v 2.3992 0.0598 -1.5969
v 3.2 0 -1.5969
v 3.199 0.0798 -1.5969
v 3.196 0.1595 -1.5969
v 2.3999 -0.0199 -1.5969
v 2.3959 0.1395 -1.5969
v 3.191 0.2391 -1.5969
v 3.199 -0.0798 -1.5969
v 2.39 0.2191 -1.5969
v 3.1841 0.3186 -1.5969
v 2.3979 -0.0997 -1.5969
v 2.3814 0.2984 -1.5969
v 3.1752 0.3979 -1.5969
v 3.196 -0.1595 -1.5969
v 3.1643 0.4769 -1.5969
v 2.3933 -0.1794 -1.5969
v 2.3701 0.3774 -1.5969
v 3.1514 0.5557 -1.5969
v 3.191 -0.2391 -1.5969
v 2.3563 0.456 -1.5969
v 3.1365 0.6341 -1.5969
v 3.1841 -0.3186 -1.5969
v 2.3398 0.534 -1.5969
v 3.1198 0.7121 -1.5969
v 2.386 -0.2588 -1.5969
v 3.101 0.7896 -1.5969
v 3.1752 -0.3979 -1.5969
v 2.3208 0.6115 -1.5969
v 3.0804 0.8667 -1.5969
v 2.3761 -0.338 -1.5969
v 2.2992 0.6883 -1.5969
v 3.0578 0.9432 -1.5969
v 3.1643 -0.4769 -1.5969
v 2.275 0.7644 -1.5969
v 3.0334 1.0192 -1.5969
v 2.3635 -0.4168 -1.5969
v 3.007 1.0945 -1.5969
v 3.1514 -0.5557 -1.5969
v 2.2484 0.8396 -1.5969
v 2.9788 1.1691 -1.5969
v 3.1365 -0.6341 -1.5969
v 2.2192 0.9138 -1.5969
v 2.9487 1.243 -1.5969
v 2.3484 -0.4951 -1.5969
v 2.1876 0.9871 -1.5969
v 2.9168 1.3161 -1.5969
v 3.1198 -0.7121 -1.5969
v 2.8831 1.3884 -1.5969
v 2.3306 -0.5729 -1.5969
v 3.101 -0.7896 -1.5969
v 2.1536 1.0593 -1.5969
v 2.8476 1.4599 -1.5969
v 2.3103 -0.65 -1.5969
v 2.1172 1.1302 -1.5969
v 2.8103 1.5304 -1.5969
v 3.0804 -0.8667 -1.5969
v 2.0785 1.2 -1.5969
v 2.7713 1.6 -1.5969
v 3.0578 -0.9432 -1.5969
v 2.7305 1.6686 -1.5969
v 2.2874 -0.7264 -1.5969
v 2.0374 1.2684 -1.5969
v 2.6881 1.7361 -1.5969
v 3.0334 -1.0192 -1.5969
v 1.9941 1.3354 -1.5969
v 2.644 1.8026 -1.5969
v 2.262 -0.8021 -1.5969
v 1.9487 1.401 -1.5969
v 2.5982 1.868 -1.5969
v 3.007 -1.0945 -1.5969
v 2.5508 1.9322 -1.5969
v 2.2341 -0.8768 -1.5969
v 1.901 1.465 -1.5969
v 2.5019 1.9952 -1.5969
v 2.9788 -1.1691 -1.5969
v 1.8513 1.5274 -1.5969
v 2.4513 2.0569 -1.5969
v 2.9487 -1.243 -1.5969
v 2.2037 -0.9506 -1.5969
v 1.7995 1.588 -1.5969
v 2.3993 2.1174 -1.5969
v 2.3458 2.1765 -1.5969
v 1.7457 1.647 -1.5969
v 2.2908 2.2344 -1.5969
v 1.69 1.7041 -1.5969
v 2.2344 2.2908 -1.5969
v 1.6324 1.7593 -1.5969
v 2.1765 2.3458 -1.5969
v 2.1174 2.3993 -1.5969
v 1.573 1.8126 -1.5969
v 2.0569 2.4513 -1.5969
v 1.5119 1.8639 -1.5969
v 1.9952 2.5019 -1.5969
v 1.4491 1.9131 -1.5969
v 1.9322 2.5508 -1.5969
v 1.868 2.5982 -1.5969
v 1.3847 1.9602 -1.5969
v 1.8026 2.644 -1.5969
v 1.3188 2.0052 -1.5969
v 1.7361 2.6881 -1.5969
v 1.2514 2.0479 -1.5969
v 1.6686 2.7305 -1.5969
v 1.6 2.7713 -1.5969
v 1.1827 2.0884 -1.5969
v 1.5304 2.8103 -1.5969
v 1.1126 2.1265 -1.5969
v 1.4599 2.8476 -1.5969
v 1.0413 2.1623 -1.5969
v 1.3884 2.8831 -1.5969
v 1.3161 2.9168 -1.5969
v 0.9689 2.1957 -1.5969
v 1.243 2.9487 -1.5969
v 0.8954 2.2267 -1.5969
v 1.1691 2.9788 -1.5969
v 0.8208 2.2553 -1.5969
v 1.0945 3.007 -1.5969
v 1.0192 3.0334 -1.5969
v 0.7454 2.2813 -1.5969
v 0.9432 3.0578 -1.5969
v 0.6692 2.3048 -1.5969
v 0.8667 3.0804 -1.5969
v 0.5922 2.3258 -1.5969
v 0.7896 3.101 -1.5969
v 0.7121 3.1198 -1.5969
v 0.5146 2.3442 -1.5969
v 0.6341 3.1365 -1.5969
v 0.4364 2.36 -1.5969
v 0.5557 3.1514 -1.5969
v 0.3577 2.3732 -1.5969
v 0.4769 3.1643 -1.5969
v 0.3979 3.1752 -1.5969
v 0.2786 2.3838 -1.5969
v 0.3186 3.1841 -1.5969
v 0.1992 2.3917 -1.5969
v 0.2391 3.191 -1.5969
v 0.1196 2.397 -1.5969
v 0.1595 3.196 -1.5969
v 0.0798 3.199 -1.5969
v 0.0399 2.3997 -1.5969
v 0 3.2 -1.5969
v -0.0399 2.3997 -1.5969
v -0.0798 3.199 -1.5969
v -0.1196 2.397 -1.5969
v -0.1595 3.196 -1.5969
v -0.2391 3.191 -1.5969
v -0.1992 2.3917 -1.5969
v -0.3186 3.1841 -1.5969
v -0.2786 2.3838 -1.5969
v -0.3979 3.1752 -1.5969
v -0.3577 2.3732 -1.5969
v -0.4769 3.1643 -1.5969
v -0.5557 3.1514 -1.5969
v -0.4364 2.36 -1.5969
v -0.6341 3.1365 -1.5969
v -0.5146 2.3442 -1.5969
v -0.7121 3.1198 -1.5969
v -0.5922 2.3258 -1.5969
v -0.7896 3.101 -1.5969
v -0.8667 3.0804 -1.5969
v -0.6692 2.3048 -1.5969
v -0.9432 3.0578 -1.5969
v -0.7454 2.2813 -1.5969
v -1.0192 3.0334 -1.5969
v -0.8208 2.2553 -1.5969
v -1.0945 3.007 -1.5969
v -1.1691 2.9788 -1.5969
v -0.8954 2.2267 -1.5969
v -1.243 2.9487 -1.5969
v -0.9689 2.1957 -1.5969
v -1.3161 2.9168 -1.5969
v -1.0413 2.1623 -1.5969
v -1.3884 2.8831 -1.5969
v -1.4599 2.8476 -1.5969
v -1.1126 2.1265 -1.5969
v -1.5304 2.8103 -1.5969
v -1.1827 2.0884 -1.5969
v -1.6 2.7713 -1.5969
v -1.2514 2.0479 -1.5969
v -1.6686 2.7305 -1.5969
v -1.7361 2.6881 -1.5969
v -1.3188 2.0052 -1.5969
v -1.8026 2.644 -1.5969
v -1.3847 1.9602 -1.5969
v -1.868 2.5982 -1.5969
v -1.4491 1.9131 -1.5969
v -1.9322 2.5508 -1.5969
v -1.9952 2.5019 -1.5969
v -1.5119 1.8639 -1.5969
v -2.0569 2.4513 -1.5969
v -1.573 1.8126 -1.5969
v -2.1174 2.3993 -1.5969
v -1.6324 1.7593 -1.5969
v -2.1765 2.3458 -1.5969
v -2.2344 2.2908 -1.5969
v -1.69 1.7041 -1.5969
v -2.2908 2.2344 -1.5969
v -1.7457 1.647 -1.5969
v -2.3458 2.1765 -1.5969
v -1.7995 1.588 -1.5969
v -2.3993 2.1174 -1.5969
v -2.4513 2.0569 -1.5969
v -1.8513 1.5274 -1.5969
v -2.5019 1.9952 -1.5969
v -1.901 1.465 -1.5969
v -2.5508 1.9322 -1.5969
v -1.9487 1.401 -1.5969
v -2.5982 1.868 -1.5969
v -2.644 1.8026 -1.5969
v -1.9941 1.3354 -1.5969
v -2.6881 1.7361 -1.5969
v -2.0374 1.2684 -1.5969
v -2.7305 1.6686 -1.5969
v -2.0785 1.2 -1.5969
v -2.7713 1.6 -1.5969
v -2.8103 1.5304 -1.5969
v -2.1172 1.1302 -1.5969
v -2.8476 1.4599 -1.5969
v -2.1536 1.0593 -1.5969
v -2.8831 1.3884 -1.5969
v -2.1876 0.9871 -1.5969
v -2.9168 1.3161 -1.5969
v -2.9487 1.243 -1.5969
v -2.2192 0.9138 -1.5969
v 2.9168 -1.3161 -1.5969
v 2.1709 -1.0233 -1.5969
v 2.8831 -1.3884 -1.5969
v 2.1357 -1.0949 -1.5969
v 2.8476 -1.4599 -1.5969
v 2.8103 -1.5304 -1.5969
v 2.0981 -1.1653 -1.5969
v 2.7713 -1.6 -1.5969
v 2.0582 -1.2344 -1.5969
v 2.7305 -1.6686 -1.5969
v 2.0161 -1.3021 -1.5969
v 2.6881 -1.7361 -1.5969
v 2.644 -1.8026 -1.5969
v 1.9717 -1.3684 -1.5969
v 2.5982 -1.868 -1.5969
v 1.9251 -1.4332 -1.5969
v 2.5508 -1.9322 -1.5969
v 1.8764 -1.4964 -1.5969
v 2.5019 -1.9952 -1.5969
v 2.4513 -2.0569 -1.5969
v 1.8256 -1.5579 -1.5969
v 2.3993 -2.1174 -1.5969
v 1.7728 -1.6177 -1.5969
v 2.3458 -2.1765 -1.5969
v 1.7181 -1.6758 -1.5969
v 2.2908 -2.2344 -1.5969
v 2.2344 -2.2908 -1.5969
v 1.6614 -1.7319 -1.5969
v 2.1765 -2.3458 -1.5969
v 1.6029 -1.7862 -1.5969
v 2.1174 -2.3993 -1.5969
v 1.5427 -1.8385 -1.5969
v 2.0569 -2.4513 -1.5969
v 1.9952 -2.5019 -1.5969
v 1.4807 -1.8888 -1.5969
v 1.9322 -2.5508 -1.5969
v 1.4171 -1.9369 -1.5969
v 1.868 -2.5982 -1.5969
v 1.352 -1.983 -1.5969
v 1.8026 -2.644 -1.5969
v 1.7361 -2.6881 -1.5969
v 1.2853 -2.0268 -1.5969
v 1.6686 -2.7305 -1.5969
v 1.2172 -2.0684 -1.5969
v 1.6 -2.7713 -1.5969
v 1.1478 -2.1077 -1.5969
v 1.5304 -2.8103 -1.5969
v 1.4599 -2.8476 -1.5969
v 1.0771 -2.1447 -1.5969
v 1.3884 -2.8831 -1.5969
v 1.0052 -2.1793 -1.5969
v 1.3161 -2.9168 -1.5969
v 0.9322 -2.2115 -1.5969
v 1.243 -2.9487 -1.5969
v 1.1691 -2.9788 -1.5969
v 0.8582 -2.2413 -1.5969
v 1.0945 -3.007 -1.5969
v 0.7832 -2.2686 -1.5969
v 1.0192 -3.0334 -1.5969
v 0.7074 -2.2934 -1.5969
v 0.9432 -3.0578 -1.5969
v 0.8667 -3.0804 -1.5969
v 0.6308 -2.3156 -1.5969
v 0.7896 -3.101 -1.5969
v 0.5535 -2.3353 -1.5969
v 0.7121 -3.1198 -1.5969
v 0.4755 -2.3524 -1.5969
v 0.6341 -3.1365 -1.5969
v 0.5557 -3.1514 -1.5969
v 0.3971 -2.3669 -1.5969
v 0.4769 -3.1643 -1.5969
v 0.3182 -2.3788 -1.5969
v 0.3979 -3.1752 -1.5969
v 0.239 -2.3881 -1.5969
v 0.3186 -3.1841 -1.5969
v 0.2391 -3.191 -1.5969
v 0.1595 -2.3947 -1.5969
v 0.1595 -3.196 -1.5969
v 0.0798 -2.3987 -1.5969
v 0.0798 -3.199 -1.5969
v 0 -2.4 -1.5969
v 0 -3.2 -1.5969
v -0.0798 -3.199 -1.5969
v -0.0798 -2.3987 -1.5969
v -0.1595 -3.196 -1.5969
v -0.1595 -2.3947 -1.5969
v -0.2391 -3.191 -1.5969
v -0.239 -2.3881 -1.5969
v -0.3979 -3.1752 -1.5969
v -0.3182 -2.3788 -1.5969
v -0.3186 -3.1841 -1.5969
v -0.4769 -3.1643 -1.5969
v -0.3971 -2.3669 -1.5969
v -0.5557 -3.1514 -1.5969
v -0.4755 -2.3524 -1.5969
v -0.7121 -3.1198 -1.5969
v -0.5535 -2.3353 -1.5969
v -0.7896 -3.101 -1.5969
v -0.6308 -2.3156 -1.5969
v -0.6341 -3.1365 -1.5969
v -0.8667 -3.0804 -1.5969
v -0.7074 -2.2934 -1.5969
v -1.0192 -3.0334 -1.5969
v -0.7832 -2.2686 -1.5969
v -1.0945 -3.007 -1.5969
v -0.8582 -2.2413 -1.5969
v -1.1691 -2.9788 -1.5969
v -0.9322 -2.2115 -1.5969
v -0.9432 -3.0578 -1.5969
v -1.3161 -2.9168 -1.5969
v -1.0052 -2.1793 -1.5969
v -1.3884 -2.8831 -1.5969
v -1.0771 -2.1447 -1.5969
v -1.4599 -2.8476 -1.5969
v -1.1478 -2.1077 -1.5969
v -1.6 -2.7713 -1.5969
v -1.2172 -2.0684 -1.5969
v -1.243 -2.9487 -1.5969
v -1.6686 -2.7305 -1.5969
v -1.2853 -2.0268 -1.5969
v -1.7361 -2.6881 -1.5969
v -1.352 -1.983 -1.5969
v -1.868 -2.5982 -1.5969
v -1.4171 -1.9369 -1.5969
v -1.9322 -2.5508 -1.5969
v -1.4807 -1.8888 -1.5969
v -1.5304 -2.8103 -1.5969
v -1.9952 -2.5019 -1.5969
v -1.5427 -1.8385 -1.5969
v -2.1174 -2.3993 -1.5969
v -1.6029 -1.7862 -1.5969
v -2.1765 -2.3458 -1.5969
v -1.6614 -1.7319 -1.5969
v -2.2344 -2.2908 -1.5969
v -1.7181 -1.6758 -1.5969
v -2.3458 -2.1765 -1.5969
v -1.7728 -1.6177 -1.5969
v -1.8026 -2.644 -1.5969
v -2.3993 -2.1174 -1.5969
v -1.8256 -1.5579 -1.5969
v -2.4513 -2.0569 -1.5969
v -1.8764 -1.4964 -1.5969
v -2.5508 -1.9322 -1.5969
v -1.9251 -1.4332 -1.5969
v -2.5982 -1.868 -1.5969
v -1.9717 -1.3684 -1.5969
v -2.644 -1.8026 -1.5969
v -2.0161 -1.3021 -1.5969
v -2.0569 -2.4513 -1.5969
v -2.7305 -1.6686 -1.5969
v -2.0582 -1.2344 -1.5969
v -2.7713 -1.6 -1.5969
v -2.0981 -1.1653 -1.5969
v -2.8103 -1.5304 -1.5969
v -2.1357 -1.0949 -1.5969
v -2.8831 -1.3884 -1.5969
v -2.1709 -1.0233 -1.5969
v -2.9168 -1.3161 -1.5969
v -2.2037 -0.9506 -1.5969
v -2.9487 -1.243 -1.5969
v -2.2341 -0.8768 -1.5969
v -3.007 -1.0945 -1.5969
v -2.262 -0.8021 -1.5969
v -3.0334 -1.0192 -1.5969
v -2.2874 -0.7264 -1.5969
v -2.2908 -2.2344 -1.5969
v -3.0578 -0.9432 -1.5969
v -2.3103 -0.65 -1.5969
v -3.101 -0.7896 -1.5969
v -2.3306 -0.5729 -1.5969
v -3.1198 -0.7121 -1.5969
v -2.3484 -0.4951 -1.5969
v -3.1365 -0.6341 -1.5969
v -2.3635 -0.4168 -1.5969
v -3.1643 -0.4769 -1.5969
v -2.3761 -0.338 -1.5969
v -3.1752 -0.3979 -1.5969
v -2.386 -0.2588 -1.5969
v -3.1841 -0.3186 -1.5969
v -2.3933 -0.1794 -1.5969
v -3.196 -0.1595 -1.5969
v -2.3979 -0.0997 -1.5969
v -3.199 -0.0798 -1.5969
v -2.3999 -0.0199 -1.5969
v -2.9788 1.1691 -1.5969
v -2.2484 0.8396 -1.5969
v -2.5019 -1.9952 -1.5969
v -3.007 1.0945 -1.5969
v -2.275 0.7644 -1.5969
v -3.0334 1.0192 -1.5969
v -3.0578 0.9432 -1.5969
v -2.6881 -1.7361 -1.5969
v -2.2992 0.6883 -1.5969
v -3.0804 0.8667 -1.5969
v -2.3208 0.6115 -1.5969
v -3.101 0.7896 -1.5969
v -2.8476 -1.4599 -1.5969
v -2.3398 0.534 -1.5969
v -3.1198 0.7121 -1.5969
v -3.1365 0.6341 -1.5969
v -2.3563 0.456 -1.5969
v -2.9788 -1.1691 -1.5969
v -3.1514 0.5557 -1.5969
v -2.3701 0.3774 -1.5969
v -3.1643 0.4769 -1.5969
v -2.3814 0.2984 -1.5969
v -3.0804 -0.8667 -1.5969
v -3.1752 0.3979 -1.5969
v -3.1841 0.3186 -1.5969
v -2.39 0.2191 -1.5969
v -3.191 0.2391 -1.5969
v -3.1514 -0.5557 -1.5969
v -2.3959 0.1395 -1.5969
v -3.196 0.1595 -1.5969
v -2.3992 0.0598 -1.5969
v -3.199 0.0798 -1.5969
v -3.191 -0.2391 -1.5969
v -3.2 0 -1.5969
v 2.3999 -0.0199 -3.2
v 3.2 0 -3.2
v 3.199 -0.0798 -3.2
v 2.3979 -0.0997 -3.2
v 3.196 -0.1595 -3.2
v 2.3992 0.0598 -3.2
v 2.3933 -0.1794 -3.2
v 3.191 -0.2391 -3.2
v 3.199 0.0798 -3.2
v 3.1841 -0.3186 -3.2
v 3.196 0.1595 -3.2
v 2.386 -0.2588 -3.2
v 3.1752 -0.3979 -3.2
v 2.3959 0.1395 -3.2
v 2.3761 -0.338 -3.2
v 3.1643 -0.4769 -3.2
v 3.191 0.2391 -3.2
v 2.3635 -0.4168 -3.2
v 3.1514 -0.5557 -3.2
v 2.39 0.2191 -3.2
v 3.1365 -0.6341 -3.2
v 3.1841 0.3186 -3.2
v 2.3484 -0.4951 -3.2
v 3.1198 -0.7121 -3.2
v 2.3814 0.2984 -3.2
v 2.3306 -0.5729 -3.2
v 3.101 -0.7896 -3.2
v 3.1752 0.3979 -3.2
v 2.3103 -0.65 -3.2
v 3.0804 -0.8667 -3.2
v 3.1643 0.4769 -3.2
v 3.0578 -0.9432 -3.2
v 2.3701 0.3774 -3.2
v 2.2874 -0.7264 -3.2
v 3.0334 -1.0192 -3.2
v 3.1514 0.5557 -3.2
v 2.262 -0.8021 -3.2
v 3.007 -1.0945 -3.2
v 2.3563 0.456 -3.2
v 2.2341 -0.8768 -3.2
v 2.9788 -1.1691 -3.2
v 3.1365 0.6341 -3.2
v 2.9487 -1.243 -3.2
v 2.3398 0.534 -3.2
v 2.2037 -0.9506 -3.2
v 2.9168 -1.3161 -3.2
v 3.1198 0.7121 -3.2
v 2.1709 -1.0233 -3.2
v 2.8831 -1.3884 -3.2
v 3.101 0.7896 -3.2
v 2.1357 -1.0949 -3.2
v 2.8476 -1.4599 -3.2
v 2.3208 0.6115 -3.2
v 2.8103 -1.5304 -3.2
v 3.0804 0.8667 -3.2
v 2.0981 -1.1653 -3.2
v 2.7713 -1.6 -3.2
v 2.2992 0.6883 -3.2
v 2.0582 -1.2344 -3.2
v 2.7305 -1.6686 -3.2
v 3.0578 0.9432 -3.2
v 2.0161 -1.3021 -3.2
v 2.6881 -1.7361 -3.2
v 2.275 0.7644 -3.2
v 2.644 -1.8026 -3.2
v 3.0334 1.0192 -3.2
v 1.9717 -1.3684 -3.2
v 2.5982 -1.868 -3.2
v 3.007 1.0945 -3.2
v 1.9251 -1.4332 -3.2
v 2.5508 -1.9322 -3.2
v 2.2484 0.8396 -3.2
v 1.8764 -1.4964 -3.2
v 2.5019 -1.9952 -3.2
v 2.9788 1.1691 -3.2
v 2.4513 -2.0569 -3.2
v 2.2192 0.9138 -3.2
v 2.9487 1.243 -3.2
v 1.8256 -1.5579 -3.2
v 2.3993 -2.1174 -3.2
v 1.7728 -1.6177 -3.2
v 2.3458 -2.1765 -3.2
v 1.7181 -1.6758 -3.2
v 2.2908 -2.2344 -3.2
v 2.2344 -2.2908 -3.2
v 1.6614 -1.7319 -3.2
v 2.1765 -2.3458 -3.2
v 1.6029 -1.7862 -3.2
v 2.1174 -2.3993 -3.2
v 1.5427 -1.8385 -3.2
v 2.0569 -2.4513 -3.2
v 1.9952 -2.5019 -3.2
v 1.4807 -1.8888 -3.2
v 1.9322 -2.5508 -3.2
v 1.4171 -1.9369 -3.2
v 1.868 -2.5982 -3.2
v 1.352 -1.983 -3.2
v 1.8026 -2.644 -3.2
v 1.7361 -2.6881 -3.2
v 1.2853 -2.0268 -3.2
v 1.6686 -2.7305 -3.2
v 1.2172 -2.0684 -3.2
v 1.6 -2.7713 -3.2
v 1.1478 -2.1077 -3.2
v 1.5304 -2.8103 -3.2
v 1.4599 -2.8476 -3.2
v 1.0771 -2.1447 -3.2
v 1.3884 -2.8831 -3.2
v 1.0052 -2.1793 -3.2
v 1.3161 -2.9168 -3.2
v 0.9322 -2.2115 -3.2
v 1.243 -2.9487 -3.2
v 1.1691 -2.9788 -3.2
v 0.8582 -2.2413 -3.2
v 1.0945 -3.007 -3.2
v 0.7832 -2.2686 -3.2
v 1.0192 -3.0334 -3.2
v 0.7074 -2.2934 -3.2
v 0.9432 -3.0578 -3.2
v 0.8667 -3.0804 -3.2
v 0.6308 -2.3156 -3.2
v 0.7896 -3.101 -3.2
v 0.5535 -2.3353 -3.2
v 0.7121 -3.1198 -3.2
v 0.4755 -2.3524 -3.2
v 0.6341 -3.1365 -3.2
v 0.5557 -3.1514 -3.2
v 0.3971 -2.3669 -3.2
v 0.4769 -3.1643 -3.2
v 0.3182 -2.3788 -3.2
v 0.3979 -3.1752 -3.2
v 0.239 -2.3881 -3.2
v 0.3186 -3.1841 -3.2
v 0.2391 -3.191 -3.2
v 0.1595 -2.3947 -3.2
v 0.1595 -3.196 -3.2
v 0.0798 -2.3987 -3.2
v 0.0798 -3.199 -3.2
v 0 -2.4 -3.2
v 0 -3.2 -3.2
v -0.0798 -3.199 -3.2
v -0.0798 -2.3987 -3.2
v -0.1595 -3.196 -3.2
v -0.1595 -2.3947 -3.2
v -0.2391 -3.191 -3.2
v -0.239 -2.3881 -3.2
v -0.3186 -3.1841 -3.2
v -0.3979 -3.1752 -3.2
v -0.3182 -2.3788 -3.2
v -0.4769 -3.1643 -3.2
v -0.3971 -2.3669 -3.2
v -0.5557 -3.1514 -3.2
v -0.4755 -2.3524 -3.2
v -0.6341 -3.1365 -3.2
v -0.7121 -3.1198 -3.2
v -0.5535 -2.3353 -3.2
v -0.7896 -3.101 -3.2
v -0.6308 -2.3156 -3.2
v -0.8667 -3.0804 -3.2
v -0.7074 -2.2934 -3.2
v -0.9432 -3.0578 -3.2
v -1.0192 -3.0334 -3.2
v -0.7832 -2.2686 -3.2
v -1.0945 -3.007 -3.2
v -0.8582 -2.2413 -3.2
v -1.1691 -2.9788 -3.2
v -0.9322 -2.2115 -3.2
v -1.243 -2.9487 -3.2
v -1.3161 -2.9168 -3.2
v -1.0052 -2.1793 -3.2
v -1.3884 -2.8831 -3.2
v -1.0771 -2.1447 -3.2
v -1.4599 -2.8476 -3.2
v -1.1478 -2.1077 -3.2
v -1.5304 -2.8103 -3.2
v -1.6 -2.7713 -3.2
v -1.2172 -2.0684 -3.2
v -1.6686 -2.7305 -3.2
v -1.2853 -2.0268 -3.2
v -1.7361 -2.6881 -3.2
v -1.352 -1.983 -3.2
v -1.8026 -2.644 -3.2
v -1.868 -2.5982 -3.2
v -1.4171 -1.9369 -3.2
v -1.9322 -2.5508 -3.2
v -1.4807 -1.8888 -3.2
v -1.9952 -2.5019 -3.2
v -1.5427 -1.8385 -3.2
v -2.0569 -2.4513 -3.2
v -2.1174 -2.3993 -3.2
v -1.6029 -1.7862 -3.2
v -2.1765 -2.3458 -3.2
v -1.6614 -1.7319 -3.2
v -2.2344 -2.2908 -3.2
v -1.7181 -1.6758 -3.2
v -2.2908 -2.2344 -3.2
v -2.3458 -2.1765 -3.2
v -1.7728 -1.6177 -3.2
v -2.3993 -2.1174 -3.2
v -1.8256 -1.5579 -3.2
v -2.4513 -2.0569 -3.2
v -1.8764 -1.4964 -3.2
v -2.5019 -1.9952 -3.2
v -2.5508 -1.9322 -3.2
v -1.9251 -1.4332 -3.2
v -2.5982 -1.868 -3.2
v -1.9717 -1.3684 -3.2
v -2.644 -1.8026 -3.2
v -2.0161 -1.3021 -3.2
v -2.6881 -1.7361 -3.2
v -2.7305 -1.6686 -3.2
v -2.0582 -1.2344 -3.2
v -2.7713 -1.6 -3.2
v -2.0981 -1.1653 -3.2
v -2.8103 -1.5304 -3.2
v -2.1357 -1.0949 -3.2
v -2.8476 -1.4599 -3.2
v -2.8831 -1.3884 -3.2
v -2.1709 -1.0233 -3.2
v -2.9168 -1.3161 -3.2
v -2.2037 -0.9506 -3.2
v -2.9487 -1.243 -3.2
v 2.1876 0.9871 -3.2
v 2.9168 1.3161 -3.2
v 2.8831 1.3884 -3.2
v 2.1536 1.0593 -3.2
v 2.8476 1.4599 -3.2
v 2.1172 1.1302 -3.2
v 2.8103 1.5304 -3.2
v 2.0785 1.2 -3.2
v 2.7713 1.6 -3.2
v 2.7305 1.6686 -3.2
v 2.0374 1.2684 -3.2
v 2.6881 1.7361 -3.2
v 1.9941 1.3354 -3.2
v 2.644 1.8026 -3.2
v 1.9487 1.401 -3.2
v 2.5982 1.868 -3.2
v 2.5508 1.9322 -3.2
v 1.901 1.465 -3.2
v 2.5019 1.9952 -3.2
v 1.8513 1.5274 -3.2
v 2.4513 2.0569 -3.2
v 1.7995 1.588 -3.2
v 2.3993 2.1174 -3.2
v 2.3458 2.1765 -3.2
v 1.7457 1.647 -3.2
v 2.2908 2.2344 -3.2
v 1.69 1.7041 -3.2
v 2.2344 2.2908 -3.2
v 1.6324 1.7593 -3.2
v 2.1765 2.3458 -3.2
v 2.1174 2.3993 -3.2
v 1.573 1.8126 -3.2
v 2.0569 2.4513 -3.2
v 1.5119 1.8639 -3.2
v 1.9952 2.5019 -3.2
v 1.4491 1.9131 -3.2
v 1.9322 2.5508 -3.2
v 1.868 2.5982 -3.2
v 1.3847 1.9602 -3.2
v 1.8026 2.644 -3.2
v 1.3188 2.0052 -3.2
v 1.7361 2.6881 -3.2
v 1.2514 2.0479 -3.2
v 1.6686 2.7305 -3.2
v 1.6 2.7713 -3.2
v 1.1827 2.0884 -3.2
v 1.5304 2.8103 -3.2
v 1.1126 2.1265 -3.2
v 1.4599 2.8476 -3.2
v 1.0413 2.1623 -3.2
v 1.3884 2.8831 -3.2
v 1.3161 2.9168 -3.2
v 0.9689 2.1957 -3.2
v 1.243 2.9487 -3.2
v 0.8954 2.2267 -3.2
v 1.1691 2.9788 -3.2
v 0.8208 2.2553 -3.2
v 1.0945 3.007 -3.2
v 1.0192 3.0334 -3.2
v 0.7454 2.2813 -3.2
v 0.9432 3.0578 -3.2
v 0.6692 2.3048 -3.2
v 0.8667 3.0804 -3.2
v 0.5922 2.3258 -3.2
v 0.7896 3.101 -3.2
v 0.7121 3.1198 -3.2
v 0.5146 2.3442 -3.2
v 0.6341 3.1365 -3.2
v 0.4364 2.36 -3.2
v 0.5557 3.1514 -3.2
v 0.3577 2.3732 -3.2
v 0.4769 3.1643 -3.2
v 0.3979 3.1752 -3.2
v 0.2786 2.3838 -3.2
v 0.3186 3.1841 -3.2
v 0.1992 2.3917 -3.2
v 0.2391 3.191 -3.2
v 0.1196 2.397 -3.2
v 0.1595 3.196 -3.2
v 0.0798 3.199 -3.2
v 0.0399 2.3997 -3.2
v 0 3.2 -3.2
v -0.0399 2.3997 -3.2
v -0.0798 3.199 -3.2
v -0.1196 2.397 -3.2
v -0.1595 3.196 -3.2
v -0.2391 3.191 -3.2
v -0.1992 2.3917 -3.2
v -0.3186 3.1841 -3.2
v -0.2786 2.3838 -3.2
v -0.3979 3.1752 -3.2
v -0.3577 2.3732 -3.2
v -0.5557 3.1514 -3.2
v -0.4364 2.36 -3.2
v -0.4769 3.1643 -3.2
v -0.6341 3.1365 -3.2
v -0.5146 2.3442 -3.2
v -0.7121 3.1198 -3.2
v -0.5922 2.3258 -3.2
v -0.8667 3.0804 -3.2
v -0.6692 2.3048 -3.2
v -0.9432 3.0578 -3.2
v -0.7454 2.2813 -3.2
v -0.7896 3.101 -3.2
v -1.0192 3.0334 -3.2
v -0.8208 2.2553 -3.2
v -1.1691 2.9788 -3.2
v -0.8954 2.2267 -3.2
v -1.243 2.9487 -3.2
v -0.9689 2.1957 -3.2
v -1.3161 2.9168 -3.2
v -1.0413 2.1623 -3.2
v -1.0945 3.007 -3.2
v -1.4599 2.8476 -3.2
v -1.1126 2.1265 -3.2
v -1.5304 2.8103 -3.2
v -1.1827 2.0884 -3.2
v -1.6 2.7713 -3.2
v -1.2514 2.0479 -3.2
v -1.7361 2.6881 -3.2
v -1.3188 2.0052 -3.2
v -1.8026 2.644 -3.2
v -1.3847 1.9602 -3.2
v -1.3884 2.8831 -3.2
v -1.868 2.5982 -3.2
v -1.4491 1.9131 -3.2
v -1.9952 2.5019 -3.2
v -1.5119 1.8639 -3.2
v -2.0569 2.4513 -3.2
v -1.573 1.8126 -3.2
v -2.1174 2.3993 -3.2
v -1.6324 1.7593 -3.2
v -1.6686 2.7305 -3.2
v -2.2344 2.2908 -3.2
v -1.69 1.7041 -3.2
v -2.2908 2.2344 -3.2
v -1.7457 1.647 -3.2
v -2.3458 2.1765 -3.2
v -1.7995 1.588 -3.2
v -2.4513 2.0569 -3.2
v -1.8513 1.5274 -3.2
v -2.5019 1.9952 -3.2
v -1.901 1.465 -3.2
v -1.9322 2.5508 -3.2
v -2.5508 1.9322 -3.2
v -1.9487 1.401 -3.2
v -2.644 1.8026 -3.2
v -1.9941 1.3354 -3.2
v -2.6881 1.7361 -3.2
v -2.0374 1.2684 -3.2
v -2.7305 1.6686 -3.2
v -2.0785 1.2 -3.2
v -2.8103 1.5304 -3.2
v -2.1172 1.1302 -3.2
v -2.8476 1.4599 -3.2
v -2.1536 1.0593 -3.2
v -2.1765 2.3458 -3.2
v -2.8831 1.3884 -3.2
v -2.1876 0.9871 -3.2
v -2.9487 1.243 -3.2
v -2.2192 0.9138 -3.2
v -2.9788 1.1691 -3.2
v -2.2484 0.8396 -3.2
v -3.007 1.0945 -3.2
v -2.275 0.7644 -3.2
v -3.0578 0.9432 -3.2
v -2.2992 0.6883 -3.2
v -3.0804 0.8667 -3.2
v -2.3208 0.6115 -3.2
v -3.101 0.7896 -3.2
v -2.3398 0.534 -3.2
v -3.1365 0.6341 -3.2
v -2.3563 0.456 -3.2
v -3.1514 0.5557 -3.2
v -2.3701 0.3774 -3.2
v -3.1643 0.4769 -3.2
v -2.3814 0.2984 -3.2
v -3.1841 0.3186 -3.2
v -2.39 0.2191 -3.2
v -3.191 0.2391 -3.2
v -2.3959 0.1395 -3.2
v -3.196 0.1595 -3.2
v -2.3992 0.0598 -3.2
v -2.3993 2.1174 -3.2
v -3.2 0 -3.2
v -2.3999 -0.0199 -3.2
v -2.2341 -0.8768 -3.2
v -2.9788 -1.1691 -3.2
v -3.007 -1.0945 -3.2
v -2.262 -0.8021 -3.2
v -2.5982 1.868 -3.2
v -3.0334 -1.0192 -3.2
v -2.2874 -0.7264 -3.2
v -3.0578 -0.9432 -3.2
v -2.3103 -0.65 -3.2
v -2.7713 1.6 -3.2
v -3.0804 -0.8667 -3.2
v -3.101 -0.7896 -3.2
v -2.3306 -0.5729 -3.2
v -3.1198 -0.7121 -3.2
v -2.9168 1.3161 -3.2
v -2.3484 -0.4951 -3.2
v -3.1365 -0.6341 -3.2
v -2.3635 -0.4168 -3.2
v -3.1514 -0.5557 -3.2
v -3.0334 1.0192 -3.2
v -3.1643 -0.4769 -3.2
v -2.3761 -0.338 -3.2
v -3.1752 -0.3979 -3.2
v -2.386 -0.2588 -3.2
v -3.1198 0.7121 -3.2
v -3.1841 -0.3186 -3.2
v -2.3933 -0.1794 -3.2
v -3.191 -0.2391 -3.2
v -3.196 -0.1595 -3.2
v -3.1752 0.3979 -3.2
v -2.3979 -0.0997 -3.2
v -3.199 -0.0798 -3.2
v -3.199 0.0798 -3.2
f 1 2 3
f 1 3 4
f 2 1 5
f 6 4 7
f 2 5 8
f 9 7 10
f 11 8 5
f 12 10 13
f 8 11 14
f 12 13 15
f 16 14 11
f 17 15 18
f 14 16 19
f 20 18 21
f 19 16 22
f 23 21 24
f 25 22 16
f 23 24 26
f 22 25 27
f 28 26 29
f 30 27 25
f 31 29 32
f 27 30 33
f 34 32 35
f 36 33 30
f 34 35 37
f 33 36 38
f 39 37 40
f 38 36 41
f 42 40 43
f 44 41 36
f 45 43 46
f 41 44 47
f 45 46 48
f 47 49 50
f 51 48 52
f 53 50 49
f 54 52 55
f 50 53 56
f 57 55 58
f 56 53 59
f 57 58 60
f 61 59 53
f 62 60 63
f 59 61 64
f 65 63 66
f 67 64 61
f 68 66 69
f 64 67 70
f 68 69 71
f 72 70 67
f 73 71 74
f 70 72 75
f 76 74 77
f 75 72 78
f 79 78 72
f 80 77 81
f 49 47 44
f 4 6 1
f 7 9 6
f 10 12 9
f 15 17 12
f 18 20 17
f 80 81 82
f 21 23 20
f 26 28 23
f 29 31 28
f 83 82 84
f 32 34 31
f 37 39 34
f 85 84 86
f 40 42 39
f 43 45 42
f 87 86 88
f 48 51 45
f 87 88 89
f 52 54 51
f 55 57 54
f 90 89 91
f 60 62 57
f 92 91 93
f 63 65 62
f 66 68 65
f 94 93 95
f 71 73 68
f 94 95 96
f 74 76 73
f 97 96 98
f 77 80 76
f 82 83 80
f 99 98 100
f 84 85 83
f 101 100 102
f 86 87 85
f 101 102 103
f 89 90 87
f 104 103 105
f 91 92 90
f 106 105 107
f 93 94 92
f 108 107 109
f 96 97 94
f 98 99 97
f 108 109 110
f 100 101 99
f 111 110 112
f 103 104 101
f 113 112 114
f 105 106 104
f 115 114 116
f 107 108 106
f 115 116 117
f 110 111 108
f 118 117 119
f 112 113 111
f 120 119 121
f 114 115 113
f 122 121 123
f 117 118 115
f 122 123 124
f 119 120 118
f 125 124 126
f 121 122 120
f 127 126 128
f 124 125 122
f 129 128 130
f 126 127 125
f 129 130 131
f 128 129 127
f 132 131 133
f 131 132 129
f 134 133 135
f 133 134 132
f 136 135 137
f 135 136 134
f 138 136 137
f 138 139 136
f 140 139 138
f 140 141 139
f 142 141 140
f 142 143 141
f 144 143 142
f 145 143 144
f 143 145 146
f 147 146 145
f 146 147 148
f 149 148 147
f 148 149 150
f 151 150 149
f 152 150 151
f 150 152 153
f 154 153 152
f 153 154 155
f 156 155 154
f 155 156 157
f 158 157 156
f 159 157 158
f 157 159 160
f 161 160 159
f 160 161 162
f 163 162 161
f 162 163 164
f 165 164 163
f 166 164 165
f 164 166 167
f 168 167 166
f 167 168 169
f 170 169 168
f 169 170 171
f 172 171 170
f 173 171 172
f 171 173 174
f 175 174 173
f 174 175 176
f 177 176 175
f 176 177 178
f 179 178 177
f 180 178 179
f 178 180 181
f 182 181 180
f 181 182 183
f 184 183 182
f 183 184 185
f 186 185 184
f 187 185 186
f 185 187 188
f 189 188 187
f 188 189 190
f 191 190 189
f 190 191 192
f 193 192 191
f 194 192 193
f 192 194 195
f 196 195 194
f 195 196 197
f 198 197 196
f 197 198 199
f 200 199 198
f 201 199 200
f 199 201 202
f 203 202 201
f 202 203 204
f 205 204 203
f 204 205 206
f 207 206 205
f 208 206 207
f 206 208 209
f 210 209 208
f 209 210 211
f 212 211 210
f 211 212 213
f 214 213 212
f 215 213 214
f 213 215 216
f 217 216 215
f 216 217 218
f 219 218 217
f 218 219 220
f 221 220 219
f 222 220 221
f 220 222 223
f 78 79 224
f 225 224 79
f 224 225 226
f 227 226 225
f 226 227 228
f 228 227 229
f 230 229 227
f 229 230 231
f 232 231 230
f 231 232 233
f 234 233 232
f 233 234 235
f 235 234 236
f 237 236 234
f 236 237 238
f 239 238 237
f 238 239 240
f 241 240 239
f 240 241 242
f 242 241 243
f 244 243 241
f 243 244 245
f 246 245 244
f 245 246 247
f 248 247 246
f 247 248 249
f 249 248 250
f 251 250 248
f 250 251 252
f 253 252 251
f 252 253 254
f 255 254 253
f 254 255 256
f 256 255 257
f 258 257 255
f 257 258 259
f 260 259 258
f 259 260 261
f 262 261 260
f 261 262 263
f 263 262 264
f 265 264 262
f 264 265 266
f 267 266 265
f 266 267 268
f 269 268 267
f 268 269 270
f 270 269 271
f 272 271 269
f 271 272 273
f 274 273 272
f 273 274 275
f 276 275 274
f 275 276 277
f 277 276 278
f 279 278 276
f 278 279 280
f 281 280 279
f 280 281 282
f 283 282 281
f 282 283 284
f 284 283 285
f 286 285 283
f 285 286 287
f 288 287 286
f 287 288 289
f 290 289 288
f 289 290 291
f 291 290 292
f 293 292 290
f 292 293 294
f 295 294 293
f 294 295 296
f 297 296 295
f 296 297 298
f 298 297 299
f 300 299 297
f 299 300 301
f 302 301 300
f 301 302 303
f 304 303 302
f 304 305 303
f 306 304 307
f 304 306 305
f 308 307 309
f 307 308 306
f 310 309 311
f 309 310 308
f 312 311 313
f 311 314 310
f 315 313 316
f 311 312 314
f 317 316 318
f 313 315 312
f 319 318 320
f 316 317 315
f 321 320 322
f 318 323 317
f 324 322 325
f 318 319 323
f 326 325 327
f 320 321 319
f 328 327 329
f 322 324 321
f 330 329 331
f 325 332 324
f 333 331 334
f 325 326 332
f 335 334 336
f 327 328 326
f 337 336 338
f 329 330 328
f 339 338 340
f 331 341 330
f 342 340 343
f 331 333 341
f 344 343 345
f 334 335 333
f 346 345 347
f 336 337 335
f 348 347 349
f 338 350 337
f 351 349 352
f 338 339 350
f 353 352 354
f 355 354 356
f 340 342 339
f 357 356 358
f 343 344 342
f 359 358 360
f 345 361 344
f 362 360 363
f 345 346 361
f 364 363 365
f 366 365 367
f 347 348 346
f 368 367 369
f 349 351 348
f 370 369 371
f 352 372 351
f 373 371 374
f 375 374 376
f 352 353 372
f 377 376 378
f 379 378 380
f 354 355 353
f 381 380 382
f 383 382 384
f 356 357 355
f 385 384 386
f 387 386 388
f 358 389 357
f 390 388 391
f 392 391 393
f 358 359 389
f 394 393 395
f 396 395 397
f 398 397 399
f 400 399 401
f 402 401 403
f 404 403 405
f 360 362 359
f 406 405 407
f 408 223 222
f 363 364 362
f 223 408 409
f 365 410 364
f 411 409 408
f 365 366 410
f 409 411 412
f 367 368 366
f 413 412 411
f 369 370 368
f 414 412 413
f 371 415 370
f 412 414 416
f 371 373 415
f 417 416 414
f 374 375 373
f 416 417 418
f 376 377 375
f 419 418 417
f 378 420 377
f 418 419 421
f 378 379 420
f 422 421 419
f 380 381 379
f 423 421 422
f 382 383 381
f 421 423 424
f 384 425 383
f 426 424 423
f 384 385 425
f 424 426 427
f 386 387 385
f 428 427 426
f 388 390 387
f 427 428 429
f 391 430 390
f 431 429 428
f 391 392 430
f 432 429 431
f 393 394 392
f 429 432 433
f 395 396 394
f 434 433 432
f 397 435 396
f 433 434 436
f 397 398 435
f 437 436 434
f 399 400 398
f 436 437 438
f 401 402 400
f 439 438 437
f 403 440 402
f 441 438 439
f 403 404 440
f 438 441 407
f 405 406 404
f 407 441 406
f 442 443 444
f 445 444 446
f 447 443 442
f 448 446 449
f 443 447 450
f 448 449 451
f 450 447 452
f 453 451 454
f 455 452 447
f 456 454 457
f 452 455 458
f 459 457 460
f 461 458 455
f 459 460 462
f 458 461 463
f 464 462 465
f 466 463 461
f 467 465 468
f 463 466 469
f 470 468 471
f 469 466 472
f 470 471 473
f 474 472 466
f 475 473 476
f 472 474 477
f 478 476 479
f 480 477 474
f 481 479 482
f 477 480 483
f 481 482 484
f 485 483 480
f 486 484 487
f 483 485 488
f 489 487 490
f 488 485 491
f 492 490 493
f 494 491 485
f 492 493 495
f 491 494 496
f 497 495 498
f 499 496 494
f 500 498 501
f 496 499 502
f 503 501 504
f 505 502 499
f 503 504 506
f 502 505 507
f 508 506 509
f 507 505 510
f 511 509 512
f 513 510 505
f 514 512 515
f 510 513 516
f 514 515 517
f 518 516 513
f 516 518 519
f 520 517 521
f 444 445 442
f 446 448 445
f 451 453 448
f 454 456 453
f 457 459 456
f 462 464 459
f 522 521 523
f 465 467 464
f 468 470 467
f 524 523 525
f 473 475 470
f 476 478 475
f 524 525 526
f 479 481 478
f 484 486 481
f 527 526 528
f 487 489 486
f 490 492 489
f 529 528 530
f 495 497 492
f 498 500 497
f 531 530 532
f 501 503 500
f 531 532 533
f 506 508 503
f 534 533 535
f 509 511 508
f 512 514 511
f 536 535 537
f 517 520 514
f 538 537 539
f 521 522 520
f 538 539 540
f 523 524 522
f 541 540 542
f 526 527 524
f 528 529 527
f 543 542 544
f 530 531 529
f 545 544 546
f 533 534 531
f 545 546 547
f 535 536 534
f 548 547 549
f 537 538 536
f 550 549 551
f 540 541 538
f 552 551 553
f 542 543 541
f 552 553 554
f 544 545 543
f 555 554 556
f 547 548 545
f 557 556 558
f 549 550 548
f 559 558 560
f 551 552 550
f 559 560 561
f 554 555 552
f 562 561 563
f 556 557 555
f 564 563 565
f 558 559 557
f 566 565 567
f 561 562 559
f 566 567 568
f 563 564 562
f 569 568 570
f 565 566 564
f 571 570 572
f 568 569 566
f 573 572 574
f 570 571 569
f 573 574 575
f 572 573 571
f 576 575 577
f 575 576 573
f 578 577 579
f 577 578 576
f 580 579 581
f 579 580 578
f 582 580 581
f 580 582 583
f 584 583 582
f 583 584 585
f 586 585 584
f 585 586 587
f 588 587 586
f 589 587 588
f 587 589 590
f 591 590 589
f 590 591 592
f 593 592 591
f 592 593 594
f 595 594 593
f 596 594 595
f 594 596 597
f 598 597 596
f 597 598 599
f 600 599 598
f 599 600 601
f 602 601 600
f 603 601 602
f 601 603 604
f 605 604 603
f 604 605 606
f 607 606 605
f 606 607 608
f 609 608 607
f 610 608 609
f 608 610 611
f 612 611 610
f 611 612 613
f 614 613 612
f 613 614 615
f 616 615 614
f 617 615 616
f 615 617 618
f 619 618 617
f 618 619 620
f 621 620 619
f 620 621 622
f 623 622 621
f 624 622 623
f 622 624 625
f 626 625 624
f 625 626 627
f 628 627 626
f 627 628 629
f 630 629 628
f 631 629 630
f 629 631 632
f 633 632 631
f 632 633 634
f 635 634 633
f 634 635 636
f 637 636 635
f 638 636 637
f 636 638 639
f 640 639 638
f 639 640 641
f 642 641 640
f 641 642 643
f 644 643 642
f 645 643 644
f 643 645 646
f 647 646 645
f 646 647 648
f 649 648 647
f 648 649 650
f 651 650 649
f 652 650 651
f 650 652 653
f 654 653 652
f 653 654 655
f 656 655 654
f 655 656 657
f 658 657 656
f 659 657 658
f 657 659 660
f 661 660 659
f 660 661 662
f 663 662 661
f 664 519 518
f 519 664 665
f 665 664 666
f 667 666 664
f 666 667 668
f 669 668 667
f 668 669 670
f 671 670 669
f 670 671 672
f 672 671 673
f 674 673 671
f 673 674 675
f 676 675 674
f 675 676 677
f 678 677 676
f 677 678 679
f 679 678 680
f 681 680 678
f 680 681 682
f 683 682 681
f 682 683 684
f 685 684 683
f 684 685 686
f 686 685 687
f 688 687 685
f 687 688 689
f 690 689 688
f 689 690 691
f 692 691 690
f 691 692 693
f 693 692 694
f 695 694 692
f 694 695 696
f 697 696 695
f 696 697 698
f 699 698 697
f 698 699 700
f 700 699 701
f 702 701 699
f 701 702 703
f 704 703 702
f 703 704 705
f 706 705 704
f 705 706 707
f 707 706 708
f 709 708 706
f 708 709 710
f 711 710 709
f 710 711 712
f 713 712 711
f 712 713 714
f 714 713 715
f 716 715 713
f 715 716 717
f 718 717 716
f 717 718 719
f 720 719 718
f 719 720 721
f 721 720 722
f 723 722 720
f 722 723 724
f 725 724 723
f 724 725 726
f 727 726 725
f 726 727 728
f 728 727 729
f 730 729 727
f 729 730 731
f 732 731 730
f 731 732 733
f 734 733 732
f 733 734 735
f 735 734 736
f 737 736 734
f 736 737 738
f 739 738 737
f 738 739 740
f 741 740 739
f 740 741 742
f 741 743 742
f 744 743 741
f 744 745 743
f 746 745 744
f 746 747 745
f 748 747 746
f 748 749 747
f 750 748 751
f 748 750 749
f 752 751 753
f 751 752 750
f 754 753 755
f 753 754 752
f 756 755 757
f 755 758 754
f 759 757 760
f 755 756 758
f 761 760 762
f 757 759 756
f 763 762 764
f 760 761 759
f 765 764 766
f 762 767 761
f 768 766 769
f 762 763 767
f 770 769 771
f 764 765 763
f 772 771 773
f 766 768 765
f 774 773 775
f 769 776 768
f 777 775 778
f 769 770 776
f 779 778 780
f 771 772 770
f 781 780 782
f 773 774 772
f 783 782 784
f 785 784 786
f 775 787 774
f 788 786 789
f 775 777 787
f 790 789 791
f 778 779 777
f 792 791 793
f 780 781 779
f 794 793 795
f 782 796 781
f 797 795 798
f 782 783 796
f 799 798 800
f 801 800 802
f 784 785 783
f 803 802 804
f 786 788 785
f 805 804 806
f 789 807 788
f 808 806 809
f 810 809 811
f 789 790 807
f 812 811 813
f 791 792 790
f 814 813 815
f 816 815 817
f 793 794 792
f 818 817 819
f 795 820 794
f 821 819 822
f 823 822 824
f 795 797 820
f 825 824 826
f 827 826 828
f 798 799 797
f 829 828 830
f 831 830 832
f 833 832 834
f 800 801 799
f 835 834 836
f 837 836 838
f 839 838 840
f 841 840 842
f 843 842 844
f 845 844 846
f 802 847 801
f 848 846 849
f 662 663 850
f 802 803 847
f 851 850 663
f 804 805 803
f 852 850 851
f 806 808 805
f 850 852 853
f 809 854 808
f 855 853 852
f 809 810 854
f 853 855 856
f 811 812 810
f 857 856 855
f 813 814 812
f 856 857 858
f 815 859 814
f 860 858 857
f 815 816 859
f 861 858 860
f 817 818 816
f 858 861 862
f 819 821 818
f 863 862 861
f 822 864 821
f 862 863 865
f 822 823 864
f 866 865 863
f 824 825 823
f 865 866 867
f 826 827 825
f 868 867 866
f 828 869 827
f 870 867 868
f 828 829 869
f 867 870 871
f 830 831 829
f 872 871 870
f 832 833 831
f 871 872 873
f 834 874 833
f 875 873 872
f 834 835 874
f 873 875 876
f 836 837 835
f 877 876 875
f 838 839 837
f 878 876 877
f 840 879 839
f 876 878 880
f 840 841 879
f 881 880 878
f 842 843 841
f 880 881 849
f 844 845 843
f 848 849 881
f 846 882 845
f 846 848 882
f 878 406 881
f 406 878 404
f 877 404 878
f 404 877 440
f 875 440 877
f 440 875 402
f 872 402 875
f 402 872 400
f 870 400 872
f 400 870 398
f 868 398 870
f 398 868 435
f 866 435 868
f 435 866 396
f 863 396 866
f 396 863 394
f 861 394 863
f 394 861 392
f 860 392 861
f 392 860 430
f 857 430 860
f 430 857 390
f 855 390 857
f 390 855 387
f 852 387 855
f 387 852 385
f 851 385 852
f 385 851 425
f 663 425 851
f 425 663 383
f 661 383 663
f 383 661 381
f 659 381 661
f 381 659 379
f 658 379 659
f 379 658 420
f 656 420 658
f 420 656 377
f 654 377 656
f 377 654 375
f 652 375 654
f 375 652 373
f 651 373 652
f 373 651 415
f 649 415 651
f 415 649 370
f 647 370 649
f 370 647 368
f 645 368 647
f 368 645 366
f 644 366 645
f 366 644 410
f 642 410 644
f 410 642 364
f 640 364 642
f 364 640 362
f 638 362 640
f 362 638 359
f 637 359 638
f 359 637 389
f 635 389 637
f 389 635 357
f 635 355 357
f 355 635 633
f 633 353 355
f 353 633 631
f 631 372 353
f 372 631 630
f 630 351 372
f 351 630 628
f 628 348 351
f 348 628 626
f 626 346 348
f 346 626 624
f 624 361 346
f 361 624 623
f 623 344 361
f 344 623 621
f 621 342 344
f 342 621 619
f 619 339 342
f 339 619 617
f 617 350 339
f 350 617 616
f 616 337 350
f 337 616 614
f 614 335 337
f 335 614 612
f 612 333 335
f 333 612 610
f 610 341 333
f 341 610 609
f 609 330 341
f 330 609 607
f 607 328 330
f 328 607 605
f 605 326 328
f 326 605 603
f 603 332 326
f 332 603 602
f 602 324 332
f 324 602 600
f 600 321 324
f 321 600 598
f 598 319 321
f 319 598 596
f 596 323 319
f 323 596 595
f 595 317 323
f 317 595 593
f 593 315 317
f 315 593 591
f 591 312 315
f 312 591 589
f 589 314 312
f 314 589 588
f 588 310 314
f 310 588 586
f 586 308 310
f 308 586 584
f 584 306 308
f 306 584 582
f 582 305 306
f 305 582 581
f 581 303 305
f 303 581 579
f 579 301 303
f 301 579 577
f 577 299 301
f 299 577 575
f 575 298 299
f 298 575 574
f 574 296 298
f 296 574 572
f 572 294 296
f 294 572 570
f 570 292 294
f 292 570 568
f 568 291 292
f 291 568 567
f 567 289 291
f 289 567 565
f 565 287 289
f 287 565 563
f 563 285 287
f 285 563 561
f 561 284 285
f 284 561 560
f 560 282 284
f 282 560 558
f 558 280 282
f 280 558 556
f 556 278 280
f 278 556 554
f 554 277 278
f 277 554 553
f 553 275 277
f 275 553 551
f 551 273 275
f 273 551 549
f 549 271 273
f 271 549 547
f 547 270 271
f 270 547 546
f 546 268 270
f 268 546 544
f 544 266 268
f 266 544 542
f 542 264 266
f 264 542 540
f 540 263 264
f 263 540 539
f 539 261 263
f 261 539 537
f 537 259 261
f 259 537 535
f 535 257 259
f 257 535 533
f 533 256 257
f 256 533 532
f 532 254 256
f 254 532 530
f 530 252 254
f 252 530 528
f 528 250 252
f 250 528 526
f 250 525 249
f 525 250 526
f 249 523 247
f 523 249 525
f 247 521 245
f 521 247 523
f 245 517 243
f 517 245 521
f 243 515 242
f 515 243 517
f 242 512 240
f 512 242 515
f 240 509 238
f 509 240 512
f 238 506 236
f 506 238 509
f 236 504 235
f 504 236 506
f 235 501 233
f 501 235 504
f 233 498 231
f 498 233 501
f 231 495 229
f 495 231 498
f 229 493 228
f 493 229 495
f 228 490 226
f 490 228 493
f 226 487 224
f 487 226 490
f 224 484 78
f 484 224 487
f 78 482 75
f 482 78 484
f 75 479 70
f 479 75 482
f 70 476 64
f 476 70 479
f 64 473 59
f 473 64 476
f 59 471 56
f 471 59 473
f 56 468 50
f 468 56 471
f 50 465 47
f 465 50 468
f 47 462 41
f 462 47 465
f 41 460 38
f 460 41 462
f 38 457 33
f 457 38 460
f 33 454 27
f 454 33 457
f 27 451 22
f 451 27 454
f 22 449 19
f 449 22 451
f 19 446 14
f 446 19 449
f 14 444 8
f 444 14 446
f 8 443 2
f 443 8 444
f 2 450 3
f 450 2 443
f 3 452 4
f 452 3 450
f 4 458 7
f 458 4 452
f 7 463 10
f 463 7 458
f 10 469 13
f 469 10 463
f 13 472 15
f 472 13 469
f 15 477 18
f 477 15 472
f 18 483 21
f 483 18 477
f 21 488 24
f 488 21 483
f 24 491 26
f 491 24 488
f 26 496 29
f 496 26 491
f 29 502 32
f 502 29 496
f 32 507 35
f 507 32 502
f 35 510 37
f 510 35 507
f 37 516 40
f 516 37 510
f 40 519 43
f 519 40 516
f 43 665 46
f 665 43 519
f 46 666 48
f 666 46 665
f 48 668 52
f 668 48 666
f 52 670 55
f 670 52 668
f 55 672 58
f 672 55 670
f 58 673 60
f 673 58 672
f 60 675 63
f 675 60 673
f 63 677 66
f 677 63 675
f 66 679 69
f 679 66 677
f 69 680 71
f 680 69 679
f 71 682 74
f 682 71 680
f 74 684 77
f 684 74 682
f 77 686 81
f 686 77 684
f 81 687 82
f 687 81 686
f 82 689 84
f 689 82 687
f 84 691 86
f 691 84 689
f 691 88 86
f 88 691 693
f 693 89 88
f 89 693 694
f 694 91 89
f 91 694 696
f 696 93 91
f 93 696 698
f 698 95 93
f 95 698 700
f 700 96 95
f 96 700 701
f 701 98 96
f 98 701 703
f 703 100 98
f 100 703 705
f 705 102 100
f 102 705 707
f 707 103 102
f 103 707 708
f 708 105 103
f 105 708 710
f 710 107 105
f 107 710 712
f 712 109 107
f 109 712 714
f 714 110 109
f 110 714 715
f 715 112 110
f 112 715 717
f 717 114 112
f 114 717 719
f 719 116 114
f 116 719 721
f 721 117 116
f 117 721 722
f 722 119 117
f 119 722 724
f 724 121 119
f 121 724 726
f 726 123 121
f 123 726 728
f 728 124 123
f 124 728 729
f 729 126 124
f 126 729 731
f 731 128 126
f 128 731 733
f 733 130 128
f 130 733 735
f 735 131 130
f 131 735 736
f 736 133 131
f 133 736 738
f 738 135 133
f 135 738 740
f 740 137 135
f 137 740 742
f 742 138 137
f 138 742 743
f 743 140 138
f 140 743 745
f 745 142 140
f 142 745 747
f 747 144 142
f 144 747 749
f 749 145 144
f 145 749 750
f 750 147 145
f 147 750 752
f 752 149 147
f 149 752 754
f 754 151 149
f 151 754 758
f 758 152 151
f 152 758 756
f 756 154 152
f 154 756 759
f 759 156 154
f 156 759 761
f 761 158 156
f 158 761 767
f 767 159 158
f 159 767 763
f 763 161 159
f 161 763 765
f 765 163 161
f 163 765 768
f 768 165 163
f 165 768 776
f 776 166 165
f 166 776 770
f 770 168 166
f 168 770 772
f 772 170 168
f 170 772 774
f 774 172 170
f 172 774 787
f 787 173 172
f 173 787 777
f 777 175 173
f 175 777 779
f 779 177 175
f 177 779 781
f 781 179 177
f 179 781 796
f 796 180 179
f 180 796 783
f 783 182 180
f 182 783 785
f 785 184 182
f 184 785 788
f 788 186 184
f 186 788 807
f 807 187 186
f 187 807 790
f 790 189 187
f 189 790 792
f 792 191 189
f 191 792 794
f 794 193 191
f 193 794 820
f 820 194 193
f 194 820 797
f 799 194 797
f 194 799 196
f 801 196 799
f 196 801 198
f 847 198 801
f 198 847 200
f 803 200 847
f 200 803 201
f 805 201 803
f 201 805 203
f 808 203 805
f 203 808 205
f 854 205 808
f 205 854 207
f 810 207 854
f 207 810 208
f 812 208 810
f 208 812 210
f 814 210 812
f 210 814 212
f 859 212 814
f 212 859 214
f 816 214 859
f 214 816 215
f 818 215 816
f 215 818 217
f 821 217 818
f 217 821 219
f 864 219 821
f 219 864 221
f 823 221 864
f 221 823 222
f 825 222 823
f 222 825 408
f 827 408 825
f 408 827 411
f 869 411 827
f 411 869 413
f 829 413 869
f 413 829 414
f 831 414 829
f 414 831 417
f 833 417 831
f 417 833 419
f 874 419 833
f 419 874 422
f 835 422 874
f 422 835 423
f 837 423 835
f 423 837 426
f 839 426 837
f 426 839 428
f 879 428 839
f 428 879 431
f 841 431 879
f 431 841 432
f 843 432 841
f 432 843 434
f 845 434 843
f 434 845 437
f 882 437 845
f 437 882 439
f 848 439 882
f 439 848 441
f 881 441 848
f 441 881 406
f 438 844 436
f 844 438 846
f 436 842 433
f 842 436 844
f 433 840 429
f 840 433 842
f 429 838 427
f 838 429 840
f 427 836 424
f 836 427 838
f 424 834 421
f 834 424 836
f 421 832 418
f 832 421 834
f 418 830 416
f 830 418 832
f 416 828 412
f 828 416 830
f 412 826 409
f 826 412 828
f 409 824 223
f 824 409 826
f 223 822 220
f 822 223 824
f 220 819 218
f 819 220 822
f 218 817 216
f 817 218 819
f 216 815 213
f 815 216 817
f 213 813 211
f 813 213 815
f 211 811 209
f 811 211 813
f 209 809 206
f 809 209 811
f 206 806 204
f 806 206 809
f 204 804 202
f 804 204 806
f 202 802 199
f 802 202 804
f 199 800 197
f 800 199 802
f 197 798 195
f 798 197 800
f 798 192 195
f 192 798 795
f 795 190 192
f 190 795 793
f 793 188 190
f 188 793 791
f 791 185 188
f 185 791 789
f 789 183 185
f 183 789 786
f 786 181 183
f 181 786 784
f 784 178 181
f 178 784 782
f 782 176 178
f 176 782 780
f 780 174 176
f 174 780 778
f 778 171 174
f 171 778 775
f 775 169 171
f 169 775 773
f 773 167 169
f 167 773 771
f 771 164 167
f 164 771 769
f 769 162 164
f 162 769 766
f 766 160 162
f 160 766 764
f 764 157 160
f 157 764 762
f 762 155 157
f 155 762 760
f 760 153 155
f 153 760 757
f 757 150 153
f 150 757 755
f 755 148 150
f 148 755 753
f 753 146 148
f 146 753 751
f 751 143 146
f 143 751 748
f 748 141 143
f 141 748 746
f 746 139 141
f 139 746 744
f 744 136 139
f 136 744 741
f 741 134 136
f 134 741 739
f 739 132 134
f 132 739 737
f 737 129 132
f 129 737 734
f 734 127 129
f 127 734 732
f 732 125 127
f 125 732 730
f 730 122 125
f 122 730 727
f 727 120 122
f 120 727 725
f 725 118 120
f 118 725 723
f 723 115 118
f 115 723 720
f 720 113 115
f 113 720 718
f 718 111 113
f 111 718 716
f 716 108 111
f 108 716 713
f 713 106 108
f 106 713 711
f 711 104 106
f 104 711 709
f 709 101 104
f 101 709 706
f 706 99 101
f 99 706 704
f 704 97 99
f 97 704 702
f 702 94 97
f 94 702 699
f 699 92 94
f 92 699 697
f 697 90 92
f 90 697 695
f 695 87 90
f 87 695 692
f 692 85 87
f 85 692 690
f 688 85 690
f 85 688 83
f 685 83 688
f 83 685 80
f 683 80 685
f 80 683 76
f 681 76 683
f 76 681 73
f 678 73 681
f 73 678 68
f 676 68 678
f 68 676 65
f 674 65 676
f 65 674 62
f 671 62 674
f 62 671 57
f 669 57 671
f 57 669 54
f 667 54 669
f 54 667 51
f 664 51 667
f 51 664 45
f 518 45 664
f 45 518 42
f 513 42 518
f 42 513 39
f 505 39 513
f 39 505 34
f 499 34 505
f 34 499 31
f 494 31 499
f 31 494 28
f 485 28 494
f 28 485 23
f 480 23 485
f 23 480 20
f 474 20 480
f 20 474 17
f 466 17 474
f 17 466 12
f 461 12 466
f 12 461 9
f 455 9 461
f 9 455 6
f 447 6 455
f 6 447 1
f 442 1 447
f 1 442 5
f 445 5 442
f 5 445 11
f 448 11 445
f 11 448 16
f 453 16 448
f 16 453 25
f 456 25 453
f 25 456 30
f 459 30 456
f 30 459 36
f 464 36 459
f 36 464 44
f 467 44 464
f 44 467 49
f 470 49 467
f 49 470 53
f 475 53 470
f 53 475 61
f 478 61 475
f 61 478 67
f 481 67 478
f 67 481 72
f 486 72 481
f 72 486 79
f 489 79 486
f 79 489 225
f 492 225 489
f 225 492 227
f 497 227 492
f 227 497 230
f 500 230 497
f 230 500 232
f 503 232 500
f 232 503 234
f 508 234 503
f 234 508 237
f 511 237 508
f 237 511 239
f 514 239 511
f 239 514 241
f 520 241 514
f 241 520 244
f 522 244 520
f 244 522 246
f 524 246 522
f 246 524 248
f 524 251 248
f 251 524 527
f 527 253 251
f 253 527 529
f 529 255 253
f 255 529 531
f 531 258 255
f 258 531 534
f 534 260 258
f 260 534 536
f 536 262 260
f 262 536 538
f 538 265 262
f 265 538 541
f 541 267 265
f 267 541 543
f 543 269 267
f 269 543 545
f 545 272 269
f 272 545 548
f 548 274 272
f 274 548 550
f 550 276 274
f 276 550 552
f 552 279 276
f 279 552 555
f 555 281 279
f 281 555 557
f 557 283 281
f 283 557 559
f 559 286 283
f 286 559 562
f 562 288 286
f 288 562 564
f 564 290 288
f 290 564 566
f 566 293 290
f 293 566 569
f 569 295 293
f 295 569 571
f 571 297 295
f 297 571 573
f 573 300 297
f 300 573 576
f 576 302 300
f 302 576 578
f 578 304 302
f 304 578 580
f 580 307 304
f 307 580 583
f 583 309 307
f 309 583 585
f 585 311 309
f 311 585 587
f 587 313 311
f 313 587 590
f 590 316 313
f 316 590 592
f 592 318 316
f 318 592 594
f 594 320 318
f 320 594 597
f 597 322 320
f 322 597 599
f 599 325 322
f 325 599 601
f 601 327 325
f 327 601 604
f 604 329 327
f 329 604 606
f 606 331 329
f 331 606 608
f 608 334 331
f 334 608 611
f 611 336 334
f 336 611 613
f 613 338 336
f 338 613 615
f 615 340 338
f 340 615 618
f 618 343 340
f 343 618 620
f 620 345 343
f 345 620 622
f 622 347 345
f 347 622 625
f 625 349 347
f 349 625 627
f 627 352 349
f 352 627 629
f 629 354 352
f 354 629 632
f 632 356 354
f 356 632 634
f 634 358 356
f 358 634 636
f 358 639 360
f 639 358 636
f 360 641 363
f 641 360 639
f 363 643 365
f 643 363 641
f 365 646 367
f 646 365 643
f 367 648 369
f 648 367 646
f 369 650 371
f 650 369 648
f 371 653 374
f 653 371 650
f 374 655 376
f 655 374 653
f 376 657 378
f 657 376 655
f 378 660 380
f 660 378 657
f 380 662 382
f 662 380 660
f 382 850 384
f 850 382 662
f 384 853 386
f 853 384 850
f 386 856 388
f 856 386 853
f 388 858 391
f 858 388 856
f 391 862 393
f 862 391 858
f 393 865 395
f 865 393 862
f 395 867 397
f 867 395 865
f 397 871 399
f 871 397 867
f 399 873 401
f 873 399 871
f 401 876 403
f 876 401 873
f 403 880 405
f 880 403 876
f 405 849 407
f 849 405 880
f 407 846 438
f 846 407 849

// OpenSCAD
use <../lib.scad>
use <3068bp08.scad>
$fa=1; $fs=0.2;
function ldraw_lib__3068p08(realsolid=false) = [
// 0 ~Moved to 3068bp08
// 0 Name: 3068p08.dat
// 0 Author: [PTadmin]
// 0 !LDRAW_ORG Part UPDATE 2002-02
// 0 !LICENSE Licensed under CC BY 4.0 : see CAreadme.txt
// 
// 0 BFC CERTIFY CCW
  [0,"BFC","CERTIFY"],
  [0,"BFC","CCW"],
// 
// 0 !HISTORY 1999-02-01 [PTadmin] Official Update 1999-01
// 0 !HISTORY 2002-04-25 [PTadmin] Official Update 2002-02
// 0 !HISTORY 2007-06-13 [PTadmin] Header formatted for Contributor Agreement
// 0 !HISTORY 2008-07-01 [PTadmin] Official Update 2008-01
// 
// 
// 1 16 0 0 0 1 0 0 0 1 0 0 0 1 3068bp08.dat
  [1,16,0,0,0,1,0,0,0,1,0,0,0,1, ldraw_lib__3068bp08(realsolid)],
];
module ldraw_lib__3068p08(step=0, col=false, unit=2/5, alt=false, line=0.2, solid=!$preview)
    makepoly(ldraw_lib__3068p08(solid), step=step, col=col, unit=unit, alt=alt, line=line, solid=solid);
ldraw_lib__3068p08(line=0.2);
